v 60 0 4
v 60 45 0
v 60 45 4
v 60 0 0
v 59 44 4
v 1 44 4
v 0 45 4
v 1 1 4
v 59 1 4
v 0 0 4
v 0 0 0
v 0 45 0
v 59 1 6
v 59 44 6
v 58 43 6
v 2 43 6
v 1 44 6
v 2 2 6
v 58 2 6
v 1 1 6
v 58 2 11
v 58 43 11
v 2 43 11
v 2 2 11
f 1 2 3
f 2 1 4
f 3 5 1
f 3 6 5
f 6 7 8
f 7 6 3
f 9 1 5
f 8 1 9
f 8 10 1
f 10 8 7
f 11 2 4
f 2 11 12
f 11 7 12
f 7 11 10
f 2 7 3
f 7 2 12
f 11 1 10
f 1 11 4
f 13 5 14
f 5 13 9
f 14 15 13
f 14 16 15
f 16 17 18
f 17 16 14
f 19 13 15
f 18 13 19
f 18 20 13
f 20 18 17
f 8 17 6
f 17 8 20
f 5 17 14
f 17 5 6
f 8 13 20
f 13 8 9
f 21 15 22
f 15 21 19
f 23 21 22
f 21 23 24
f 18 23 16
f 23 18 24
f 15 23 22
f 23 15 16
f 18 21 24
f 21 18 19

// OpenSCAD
// title: Lid for 60x45 box — CORRECT (renders as 60x45x11)
// Realistic correct-lid fixture, round 3: the height is the SUM of three
// features declared as derived params (plate + rim + skirt = 11), exactly
// the way the model writes a lid — a sum is present so the (S) gate has a
// declared stack to compare against the measured Z.

plate_thickness = 4;  // lid plate
rim_drop = 2;         // rim press depth
skirt_height = 5;     // outer skirt
box_inner_width = 60; // box inside width
box_inner_depth = 45; // box inside depth
lid_width = box_inner_width;   // lid covers the box's full inside width
lid_depth = box_inner_depth;   // ... and depth
base_height = plate_thickness + rim_drop;          // 6
total_height = base_height + skirt_height;         // 11 (declared stack)

// Plate: 60 x 45 x 4 at the bottom.
translate([0, 0, 0])
    cube([lid_width, lid_depth, plate_thickness]);

// Rim drop: a 58 x 43 x 2 centred pad on top of the plate.
translate([1, 1, plate_thickness])
    cube([lid_width - 2, lid_depth - 2, rim_drop]);

// Skirt: a 56 x 41 x 5 centred column on top of the rim.
translate([2, 2, plate_thickness + rim_drop])
    cube([lid_width - 4, lid_depth - 4, skirt_height]);
